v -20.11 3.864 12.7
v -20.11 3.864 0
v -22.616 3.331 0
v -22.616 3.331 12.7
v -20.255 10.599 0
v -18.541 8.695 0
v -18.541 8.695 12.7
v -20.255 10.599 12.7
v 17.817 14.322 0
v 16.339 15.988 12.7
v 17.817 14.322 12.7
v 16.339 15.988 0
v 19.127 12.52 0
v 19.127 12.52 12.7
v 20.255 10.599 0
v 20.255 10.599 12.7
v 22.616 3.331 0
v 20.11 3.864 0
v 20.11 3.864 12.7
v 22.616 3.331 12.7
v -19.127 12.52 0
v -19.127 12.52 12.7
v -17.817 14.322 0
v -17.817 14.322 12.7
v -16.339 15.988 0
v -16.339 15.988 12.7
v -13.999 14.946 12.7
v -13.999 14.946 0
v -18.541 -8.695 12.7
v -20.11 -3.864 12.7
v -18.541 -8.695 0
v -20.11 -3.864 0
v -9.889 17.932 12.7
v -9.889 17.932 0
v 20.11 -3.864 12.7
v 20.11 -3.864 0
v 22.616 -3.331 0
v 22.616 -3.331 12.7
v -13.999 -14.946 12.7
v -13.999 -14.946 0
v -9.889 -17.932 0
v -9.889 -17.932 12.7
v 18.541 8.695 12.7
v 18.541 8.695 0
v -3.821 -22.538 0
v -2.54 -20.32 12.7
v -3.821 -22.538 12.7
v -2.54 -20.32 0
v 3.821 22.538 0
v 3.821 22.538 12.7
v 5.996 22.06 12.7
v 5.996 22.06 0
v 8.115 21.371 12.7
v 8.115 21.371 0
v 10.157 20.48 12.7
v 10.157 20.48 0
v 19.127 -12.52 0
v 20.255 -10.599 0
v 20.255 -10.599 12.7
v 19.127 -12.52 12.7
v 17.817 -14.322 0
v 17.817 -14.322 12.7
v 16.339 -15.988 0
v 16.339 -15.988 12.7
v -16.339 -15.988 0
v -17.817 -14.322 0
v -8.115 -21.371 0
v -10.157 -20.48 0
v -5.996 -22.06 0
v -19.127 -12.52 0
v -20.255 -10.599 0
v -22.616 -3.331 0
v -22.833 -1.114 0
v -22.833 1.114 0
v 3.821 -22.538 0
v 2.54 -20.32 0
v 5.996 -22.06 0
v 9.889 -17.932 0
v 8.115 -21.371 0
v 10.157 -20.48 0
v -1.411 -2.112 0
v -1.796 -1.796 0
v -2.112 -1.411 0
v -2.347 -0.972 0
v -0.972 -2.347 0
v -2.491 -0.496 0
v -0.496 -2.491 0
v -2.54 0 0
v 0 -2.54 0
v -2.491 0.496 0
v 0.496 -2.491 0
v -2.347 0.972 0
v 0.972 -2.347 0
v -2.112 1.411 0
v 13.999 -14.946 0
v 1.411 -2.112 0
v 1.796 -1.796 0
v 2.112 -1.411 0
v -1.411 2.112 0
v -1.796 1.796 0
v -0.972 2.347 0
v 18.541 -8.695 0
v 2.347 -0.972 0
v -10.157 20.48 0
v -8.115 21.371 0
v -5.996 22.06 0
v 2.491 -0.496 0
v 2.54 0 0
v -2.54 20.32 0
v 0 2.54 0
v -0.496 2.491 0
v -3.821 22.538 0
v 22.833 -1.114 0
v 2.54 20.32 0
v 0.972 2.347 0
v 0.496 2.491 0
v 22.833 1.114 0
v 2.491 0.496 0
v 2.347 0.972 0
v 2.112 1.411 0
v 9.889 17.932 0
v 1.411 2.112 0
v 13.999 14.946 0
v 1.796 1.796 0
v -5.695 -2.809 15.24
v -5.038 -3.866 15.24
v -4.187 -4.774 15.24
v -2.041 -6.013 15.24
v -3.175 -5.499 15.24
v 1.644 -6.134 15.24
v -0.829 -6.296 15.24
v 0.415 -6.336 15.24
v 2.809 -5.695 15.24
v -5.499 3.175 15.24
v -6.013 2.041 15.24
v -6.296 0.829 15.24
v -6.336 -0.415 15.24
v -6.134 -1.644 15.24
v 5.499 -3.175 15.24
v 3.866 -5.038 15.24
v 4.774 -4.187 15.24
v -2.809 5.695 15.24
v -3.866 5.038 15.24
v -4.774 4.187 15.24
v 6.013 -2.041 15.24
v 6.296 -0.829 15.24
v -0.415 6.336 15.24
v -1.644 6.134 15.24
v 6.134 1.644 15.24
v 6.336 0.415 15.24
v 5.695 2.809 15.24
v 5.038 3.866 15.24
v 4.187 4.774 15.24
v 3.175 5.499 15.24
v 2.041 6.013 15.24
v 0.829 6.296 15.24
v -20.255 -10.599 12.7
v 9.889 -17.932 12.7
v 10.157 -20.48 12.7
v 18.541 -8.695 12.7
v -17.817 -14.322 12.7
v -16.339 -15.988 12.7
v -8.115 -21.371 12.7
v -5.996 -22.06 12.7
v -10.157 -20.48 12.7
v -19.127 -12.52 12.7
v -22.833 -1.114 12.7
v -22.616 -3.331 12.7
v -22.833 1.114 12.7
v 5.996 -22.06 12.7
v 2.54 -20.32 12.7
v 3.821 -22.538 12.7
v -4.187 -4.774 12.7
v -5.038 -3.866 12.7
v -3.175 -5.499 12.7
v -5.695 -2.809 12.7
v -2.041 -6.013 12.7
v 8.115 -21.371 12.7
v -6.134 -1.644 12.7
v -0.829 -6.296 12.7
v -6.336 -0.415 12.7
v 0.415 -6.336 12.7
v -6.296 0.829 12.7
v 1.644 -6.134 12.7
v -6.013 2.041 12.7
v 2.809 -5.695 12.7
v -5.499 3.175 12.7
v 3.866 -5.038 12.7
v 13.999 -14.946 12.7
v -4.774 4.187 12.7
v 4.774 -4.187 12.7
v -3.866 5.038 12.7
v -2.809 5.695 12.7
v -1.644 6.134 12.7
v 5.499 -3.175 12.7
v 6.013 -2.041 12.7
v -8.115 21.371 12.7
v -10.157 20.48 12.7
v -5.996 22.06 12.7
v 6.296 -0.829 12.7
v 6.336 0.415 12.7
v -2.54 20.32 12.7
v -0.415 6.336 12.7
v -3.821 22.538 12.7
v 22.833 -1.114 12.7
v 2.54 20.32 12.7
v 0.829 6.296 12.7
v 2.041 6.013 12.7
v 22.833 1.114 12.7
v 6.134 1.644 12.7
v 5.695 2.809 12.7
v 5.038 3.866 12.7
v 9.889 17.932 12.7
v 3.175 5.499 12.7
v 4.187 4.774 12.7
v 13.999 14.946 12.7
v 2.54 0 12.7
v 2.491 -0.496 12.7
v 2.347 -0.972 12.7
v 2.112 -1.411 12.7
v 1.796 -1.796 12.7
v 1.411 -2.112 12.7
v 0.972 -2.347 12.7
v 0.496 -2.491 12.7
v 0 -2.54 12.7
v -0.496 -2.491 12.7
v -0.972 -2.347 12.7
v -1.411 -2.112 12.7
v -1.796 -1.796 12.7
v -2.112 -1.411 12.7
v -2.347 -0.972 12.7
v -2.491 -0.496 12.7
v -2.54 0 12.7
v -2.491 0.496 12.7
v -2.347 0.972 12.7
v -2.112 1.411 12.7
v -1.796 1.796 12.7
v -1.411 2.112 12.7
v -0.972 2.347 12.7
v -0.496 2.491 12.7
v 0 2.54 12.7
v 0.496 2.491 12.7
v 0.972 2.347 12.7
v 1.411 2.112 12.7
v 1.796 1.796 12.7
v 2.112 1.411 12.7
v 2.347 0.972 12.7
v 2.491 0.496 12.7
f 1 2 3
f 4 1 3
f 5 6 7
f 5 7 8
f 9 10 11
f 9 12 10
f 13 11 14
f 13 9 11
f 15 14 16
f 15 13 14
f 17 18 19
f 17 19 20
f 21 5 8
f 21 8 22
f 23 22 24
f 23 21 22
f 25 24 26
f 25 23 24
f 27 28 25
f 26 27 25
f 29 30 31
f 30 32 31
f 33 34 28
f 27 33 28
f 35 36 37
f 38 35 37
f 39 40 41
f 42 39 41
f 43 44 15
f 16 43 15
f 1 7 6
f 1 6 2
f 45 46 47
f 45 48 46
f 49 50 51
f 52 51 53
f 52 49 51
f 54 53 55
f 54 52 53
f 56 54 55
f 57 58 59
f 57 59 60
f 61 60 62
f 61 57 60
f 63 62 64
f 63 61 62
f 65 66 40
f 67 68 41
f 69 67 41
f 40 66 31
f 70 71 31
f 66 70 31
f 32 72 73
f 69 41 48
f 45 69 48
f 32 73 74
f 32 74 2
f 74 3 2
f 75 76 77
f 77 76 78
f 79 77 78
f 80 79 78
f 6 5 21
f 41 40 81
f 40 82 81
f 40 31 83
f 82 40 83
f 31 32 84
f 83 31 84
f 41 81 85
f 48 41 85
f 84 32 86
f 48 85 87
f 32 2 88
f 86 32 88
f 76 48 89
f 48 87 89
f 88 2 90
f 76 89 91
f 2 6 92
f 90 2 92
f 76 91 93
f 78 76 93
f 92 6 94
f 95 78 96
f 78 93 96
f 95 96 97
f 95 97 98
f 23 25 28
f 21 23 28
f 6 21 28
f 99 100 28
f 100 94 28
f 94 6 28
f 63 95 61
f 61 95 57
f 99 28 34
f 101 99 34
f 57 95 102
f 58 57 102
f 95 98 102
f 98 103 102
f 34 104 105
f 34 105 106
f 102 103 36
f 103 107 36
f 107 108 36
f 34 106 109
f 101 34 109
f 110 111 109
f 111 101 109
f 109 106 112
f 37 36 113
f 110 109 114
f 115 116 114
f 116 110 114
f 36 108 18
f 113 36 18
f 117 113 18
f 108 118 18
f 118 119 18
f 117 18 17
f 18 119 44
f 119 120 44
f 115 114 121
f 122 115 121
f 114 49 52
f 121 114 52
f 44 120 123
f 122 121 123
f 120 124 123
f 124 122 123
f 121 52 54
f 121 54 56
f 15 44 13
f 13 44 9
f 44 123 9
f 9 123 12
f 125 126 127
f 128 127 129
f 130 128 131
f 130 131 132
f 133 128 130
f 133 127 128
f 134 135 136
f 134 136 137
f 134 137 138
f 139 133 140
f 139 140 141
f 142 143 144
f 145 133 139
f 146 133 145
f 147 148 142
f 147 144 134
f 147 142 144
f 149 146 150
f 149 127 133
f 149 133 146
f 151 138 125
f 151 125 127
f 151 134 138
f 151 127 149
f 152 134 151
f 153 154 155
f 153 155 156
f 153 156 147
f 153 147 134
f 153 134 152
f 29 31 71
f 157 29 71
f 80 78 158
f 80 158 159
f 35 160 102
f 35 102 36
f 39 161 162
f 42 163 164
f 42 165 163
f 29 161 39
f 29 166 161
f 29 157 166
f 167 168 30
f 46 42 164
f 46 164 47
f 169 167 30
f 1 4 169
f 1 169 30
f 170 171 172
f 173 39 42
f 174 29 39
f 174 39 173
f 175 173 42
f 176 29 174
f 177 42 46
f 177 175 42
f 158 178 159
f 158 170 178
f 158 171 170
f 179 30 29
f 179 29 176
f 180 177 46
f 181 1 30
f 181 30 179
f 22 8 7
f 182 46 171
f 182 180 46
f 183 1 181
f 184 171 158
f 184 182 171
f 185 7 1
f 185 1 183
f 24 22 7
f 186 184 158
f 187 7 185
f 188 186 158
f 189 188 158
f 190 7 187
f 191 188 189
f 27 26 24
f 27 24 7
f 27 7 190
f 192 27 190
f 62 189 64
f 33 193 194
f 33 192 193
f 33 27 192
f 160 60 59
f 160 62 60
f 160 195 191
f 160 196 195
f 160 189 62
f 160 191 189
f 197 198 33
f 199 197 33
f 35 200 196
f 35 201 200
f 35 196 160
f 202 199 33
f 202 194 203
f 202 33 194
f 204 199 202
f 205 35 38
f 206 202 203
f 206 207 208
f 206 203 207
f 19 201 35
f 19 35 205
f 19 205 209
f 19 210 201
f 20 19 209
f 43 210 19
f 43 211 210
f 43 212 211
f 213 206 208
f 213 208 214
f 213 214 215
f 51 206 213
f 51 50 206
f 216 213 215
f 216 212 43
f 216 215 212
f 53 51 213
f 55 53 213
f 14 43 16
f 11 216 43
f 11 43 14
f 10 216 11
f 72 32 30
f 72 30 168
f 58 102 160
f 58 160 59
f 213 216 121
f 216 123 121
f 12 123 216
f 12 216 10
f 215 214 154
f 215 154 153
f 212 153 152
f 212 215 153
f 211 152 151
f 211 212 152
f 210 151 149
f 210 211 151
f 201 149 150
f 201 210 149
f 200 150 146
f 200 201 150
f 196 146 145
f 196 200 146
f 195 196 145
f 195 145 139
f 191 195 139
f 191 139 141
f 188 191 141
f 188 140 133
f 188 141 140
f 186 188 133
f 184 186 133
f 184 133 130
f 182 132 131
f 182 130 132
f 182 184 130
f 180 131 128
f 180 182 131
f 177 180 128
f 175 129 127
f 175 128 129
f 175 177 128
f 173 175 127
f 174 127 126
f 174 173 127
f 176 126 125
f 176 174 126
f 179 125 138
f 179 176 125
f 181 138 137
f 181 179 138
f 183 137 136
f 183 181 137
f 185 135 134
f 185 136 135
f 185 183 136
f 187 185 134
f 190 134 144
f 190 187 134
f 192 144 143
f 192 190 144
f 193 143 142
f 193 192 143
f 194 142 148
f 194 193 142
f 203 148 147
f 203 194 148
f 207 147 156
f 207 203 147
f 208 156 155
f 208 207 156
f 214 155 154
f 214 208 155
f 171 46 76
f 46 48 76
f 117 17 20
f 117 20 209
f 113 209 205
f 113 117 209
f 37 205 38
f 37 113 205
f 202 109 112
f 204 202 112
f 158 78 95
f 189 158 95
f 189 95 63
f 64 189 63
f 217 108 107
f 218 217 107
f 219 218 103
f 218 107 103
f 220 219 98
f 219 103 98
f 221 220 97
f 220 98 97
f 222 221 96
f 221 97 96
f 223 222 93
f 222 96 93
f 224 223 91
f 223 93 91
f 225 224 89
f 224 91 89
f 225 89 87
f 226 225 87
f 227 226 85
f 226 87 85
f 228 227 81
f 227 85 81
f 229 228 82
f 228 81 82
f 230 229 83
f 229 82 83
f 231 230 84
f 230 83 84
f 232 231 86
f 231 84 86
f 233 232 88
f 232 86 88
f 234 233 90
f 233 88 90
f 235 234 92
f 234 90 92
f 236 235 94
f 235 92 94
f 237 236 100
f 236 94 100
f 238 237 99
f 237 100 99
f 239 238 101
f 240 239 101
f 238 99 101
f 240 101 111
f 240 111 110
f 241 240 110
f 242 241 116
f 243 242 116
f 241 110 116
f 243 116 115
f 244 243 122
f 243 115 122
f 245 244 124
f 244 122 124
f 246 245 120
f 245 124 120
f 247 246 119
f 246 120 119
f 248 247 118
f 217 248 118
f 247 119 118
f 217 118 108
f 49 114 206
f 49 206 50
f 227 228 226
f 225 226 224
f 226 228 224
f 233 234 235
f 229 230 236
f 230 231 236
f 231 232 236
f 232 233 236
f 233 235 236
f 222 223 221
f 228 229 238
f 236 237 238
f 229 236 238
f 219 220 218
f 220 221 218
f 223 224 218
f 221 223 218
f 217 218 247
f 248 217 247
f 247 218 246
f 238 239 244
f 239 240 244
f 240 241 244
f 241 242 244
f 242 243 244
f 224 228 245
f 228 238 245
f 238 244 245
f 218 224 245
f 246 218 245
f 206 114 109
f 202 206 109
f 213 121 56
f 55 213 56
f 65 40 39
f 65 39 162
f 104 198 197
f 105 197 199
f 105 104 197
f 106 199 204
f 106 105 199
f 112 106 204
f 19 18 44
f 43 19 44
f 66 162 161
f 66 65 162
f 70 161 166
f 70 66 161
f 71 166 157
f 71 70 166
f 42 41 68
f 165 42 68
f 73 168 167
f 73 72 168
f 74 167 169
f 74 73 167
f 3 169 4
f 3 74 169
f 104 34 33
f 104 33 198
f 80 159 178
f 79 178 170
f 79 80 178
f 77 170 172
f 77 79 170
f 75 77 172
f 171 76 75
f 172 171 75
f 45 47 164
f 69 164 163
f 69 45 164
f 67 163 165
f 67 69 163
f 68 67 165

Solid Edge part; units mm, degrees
sketch "Sketch1" plane through (0, 0, 0) normal (0, 0, 1) x (1, 0, 0)
  circle A0 centre (0, 0) radius 22.86
extrude "Protrusion1" add sketch "Sketch1" along normal blind 12.7
sketch "Sketch2" plane through (0, 0, 0) normal (0, 0, 1) x (1, 0, 0)
  circle A0 centre (0, 0) radius 2.54
extrude "ExtrudedCutout_2" cut sketch "Sketch2" along normal blind 15.2909
sketch "Sketch3" plane through (0, 0, 0) normal (0, 0, 1) x (1, 0, 0)
  line L0 (0, 20.32) -> (-2.54, 20.32)
  line L1 (-2.54, 20.32) -> (-3.8208, 22.5384)
  line L2 (2.54, 20.32) -> (3.8208, 22.5384)
  line L3 (0, 20.32) -> (2.54, 20.32)
  arc A0 (-3.8208, 22.5384) -> (3.8208, 22.5384) centre (0, 0) cw
extrude "Cutout1" cut sketch "Sketch3" along normal up to vertex (12.7 mm away)
pattern_circular "Pattern1" count 10 over 360 about axis through (0, 0, 12.7) along (0, 0, 1) of "Cutout1"
sketch "Sketch4" plane through (0, 0, 12.7) normal (0, 0, 1) x (0.5, 0.866, 0)
  circle A0 centre (0, 0) radius 6.35
extrude "ExtrudedProtrusion_3" add sketch "Sketch4" along normal blind 2.54
